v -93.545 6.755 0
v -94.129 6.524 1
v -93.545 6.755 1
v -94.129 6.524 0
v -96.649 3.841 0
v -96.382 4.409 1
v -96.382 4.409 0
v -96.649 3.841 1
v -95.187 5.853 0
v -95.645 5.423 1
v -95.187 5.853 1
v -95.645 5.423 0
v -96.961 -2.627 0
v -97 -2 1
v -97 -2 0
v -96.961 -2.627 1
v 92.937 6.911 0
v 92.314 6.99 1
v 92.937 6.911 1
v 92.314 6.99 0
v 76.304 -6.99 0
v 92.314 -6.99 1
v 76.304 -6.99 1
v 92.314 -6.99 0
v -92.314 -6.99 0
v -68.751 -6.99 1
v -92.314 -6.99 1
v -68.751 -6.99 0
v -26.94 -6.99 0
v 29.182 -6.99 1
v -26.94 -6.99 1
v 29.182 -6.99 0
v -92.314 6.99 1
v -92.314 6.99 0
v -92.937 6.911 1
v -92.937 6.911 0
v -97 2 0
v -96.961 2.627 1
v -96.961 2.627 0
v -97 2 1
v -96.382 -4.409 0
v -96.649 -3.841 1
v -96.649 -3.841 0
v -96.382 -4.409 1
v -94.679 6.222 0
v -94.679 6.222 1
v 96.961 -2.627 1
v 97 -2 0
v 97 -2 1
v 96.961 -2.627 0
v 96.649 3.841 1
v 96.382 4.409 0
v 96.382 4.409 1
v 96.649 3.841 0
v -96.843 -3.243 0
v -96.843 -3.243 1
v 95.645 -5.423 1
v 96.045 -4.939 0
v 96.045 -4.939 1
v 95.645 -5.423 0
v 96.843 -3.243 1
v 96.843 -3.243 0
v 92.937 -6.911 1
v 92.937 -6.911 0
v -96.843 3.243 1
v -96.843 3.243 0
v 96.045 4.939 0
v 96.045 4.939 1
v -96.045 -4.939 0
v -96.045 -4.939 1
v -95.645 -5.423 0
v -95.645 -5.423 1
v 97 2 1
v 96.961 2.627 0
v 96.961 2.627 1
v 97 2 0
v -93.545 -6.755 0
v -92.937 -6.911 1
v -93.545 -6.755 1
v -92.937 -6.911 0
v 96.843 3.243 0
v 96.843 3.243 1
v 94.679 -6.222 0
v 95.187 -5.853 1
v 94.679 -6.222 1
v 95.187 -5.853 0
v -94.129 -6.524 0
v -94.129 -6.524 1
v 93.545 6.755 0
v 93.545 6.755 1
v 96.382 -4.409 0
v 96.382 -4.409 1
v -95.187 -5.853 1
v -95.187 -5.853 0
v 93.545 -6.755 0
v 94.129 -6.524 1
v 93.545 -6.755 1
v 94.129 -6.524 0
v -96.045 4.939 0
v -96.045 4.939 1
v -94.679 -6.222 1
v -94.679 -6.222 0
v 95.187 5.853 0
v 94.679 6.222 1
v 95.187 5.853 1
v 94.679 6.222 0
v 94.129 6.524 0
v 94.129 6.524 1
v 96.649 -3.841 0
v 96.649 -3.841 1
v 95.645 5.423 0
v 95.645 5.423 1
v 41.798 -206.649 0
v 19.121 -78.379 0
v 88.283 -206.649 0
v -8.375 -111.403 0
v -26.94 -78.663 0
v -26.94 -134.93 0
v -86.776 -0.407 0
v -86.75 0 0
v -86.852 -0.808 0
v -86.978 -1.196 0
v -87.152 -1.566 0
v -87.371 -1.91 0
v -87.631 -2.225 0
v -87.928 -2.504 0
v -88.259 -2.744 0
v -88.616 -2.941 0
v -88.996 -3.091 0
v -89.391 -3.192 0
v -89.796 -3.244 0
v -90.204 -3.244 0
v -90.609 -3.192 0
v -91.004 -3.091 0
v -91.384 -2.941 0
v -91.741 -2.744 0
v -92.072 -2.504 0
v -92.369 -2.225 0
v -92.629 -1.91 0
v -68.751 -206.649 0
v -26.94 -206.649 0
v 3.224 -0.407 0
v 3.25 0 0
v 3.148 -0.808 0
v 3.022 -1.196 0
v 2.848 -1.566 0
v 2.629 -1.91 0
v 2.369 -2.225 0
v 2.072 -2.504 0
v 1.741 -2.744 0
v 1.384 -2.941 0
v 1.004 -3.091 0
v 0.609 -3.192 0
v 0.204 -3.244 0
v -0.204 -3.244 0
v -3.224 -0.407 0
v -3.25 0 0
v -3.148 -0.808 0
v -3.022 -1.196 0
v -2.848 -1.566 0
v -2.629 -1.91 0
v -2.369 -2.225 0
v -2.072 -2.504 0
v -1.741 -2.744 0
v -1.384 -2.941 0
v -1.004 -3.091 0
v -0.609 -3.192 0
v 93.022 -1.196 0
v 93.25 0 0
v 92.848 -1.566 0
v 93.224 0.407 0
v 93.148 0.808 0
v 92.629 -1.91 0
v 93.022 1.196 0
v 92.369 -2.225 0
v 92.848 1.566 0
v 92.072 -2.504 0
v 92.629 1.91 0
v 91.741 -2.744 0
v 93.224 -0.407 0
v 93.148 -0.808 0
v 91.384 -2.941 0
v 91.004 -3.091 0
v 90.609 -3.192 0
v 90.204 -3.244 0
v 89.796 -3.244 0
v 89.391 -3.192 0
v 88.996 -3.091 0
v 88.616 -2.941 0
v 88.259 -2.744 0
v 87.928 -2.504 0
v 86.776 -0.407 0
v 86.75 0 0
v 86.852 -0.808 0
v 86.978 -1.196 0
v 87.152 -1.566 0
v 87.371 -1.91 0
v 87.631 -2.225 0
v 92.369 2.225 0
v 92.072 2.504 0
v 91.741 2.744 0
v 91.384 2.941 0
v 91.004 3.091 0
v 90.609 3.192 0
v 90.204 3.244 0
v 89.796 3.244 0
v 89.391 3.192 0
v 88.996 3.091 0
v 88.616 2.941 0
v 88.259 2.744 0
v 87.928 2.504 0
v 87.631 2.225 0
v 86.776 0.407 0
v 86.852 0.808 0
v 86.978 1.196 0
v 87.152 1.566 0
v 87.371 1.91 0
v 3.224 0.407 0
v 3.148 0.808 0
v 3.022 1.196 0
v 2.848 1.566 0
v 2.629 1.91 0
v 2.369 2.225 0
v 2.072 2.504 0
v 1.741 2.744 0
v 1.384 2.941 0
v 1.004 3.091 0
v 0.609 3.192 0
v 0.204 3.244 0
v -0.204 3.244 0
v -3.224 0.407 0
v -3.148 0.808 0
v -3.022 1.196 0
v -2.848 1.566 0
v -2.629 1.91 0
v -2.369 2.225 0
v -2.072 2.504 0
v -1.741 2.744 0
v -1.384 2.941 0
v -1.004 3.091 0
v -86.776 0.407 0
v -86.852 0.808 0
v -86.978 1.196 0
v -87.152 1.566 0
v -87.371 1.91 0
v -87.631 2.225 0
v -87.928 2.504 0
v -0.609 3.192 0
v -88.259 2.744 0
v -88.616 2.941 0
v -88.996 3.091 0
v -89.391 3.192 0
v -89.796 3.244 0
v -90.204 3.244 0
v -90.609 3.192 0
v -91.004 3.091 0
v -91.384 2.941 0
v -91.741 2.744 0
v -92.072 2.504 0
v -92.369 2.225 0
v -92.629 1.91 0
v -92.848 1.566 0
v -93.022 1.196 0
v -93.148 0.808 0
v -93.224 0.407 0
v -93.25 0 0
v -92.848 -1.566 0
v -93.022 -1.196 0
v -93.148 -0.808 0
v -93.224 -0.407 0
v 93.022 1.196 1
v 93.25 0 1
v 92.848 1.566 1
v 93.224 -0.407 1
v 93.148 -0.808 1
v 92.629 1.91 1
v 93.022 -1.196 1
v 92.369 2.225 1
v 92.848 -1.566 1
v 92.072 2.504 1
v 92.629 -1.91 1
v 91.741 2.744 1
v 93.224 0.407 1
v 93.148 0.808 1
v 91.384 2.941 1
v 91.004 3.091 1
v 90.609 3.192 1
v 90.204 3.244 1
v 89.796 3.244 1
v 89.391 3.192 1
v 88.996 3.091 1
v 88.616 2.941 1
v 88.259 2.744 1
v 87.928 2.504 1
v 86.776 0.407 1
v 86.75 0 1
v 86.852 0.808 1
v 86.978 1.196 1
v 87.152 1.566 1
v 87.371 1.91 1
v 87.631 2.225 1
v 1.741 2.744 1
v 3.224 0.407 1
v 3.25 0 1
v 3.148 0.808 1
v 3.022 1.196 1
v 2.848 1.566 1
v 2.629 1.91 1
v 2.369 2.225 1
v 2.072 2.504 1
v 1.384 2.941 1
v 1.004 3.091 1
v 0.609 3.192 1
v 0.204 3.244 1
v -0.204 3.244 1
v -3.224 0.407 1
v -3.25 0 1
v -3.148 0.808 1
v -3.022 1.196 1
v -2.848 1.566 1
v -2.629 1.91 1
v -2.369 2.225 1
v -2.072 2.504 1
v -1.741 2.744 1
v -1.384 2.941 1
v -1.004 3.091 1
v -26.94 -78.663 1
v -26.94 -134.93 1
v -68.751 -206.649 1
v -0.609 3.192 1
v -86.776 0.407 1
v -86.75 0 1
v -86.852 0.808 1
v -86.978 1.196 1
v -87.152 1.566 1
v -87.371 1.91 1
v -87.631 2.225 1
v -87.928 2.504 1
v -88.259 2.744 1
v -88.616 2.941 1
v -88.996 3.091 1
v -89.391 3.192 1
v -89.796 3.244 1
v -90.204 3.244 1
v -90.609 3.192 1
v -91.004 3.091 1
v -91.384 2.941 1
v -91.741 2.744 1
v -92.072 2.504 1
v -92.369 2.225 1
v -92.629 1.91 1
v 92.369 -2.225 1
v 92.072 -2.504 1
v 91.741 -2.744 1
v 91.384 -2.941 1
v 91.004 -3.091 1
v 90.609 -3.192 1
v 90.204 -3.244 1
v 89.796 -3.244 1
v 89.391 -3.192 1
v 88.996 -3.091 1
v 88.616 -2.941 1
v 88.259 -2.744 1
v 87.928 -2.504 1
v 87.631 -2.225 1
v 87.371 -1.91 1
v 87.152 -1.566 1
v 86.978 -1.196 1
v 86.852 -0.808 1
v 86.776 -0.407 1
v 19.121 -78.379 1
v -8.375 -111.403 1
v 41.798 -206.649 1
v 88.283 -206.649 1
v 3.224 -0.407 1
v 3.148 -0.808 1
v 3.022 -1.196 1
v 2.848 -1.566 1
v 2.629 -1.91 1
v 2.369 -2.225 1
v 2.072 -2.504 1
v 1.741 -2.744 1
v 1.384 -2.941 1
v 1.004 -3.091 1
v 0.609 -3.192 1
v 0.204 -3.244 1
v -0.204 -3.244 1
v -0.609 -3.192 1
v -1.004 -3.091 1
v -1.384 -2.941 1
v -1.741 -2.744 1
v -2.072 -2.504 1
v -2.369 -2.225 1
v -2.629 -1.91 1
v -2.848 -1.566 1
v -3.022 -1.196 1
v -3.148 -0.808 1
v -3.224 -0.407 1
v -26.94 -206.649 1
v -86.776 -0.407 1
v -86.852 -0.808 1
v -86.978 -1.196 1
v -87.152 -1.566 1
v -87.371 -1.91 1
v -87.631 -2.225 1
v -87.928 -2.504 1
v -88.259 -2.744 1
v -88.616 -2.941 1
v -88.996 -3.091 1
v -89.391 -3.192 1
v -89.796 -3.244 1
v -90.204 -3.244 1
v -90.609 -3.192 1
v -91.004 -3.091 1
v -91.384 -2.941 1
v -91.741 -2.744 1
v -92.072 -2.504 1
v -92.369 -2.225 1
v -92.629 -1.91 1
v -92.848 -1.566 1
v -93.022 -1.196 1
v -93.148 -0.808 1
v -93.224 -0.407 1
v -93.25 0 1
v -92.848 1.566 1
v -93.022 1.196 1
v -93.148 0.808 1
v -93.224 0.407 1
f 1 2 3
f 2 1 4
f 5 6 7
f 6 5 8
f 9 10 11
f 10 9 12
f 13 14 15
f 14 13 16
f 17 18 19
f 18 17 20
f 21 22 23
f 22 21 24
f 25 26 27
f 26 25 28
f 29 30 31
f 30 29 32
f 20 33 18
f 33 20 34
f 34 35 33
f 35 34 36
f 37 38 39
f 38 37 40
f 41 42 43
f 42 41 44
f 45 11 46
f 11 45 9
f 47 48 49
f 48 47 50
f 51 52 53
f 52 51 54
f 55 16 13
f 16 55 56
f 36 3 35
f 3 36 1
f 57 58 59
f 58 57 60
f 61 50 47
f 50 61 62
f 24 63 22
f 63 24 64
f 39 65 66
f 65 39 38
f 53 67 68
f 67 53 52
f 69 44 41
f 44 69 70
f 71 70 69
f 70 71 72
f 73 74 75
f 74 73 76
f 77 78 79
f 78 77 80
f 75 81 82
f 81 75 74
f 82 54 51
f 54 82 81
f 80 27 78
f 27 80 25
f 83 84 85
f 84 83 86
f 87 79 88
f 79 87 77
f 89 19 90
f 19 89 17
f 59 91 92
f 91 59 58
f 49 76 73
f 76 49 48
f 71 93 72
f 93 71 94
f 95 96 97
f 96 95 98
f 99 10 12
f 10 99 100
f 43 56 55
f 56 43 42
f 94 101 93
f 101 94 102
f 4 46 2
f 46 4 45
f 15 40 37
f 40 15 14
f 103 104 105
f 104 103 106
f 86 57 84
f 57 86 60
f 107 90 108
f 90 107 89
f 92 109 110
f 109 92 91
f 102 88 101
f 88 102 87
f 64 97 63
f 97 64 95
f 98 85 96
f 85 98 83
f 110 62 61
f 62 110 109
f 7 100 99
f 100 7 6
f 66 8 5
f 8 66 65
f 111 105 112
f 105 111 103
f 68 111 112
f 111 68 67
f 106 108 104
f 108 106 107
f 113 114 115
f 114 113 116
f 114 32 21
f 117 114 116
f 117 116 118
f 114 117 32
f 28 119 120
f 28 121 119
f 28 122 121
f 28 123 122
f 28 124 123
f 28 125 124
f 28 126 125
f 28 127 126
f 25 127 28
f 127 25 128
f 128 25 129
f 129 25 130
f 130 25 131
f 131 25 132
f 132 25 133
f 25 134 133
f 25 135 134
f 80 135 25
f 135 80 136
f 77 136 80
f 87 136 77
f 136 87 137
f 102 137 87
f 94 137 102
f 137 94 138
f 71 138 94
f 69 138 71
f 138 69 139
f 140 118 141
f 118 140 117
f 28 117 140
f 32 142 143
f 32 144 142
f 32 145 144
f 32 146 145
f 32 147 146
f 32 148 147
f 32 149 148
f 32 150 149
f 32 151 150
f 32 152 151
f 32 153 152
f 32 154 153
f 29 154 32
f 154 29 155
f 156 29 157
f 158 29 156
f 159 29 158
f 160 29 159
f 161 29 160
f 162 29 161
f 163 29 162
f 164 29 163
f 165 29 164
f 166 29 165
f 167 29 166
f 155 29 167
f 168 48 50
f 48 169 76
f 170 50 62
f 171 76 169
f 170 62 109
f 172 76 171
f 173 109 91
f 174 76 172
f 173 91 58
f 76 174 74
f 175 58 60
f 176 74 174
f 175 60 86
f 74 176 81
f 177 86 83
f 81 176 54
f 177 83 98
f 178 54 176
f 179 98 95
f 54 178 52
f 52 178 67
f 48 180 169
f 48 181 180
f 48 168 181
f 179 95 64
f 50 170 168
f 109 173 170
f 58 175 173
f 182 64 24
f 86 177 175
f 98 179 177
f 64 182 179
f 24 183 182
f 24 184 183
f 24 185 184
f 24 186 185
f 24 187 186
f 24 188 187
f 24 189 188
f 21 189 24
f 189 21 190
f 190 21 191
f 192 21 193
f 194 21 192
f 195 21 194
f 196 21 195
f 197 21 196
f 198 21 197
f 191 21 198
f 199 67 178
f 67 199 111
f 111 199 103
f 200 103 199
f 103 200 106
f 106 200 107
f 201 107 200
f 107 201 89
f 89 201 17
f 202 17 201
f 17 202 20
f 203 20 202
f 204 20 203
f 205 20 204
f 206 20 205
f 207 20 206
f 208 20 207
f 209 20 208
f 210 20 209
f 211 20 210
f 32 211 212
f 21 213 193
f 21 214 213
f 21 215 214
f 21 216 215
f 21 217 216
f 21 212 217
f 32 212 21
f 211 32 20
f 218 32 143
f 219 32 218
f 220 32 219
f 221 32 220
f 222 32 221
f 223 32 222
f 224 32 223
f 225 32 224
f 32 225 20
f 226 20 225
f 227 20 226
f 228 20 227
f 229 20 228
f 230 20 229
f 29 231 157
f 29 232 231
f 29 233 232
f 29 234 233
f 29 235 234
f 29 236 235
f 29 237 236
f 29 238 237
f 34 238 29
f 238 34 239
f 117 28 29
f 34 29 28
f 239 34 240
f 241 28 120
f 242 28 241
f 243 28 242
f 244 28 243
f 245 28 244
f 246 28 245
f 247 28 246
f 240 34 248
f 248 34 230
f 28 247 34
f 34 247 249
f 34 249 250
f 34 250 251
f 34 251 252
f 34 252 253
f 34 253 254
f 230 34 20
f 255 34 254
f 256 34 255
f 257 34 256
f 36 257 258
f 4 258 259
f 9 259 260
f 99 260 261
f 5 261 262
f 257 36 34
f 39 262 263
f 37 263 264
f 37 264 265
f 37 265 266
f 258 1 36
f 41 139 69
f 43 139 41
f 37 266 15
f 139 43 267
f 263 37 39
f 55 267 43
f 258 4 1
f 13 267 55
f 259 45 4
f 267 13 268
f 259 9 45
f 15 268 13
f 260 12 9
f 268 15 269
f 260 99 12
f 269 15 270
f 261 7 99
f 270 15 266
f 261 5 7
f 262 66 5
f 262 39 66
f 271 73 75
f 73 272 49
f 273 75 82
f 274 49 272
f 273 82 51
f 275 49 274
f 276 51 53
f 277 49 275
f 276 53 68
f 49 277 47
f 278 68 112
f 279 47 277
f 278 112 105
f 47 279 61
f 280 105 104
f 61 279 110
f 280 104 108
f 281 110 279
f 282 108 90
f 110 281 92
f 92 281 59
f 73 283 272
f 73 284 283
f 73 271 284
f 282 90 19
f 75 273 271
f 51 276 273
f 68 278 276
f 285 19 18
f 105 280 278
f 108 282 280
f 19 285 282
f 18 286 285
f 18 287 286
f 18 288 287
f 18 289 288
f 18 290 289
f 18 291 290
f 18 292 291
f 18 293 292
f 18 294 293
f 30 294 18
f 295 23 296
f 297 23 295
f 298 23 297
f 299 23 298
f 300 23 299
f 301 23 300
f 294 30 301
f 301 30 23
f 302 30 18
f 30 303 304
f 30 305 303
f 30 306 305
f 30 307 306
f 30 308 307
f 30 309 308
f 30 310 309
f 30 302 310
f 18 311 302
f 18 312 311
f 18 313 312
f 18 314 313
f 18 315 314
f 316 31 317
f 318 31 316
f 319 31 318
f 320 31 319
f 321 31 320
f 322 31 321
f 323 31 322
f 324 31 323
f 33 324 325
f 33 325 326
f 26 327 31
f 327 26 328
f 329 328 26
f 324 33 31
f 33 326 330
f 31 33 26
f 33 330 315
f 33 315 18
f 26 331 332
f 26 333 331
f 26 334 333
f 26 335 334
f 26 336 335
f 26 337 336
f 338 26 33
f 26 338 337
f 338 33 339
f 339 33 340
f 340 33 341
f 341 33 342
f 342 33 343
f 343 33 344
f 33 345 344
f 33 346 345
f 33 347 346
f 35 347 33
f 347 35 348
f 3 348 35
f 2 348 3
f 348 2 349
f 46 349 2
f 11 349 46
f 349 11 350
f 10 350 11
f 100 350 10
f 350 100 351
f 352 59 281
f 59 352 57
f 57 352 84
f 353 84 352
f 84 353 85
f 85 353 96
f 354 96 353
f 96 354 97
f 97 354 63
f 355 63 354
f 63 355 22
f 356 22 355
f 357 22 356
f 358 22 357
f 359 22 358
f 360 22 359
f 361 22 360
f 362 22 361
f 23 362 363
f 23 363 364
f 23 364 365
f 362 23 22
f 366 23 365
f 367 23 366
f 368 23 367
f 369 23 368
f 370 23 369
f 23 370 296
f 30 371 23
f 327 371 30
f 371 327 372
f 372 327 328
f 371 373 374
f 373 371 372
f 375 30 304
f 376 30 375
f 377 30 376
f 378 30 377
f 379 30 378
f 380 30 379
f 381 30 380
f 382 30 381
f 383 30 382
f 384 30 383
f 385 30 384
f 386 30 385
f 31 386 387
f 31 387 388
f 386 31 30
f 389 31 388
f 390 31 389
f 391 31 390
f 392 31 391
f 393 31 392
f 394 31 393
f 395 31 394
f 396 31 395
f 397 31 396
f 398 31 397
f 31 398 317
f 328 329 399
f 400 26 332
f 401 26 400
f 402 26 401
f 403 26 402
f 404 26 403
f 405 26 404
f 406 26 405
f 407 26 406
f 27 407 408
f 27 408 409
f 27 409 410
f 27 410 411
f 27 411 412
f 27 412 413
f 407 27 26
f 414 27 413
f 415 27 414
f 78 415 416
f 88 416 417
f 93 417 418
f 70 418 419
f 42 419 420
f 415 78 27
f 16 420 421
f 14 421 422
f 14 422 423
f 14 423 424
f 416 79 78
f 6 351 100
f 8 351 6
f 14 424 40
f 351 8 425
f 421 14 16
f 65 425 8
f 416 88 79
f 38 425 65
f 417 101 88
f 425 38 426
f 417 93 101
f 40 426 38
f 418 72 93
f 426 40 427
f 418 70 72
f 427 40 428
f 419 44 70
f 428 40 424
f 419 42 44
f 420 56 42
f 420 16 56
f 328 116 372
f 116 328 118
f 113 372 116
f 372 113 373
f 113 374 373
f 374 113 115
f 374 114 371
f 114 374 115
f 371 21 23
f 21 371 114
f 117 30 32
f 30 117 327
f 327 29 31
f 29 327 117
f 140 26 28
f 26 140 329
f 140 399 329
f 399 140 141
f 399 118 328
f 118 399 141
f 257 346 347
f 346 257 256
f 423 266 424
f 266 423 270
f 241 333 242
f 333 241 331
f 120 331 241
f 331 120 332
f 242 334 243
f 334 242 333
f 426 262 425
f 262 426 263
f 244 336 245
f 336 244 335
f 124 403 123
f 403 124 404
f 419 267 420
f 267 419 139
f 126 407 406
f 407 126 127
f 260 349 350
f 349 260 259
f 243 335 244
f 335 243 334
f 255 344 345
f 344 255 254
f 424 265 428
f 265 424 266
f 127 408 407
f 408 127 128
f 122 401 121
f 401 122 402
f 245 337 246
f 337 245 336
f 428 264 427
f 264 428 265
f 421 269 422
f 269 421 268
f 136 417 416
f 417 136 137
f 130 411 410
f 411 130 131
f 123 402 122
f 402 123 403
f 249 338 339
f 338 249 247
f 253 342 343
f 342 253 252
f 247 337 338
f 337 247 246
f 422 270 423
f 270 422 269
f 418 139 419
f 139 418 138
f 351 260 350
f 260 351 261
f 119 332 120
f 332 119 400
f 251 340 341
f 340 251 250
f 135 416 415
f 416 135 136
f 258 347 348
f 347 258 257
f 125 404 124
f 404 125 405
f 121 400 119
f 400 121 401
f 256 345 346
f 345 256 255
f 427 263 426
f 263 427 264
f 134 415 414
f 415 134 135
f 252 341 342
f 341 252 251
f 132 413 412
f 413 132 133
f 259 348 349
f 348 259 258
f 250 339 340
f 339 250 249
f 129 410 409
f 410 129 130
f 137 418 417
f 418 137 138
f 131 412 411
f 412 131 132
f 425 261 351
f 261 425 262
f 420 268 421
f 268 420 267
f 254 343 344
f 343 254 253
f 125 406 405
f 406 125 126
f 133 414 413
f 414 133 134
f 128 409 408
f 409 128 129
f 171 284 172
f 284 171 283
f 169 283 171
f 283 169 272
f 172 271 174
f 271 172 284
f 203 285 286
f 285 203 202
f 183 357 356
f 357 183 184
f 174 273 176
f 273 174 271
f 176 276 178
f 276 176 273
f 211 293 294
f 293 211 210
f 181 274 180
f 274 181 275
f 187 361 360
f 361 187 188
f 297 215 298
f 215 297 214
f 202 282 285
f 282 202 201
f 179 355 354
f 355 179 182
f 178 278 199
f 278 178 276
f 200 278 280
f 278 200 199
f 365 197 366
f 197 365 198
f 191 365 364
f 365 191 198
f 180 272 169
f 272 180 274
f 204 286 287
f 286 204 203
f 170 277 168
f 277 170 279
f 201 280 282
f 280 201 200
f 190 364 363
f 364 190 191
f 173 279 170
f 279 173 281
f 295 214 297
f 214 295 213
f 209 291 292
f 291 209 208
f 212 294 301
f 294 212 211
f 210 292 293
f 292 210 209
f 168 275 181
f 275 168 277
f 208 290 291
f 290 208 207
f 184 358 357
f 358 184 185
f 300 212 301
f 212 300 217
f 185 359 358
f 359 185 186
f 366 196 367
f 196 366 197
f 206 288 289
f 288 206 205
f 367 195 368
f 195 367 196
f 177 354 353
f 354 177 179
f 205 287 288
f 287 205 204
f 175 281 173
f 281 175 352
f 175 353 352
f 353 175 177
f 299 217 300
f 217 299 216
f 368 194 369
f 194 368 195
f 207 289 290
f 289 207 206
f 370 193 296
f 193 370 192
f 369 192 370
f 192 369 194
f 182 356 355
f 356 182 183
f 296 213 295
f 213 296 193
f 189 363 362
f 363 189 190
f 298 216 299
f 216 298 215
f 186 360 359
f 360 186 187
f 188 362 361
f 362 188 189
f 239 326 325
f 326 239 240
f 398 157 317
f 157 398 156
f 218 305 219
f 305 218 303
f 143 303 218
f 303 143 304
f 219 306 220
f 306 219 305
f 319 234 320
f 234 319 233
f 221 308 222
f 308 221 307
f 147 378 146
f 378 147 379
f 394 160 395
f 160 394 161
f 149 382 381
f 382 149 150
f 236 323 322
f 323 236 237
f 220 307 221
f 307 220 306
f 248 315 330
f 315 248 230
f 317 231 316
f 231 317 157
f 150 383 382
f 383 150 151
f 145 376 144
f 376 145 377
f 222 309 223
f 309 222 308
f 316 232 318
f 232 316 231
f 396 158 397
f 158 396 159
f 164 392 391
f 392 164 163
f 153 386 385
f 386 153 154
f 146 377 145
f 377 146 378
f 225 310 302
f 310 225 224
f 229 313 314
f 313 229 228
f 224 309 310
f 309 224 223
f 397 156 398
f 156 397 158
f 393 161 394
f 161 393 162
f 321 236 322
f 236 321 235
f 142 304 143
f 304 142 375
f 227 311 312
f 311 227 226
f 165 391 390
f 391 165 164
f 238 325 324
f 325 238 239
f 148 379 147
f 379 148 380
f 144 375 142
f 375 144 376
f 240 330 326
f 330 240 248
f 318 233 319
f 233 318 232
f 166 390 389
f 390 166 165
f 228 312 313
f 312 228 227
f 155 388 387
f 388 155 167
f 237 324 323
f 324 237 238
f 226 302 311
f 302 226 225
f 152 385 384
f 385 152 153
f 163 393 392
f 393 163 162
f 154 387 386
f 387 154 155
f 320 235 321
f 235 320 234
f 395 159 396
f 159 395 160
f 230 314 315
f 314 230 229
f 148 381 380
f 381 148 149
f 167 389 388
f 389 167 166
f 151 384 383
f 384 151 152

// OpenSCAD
$fn = 50;


difference() {
	union() {
		translate(v = [0, 0, 0]) {
			rotate(a = [0, 0, 0]) {
				hull() {
					translate(v = [-92.0000000000, 2.0000000000, 0]) {
						rotate(a = [0, 0, 0]) {
							translate(v = [0, 0, 0]) {
								rotate(a = [0, 0, 0]) {
									cylinder(h = 1, r = 5);
								}
							}
						}
					}
					translate(v = [92.0000000000, 2.0000000000, 0]) {
						rotate(a = [0, 0, 0]) {
							translate(v = [0, 0, 0]) {
								rotate(a = [0, 0, 0]) {
									cylinder(h = 1, r = 5);
								}
							}
						}
					}
					translate(v = [-92.0000000000, -2.0000000000, 0]) {
						rotate(a = [0, 0, 0]) {
							translate(v = [0, 0, 0]) {
								rotate(a = [0, 0, 0]) {
									cylinder(h = 1, r = 5);
								}
							}
						}
					}
					translate(v = [92.0000000000, -2.0000000000, 0]) {
						rotate(a = [0, 0, 0]) {
							translate(v = [0, 0, 0]) {
								rotate(a = [0, 0, 0]) {
									cylinder(h = 1, r = 5);
								}
							}
						}
					}
				}
			}
		}
		translate(v = [0, 0, 0]) {
			rotate(a = [0, 0, 0]) {
				linear_extrude(height = 1) {
					text(font = "DejaVu Sans Mono:style=Bold", halign = "center", size = 209.0000000000, text = "K", valign = "top");
				}
			}
		}
	}
	union() {
		translate(v = [-90.0000000000, 0.0000000000, -125.0000000000]) {
			rotate(a = [0, 0, 0]) {
				cylinder(h = 250, r = 3.2500000000);
			}
		}
		translate(v = [90.0000000000, 0.0000000000, -125.0000000000]) {
			rotate(a = [0, 0, 0]) {
				cylinder(h = 250, r = 3.2500000000);
			}
		}
		translate(v = [90.0000000000, 0.0000000000, -125.0000000000]) {
			rotate(a = [0, 0, 0]) {
				cylinder(h = 250, r = 3.2500000000);
			}
		}
		translate(v = [0, 0, -125.0000000000]) {
			rotate(a = [0, 0, 0]) {
				cylinder(h = 250, r = 3.2500000000);
			}
		}
	}
}
